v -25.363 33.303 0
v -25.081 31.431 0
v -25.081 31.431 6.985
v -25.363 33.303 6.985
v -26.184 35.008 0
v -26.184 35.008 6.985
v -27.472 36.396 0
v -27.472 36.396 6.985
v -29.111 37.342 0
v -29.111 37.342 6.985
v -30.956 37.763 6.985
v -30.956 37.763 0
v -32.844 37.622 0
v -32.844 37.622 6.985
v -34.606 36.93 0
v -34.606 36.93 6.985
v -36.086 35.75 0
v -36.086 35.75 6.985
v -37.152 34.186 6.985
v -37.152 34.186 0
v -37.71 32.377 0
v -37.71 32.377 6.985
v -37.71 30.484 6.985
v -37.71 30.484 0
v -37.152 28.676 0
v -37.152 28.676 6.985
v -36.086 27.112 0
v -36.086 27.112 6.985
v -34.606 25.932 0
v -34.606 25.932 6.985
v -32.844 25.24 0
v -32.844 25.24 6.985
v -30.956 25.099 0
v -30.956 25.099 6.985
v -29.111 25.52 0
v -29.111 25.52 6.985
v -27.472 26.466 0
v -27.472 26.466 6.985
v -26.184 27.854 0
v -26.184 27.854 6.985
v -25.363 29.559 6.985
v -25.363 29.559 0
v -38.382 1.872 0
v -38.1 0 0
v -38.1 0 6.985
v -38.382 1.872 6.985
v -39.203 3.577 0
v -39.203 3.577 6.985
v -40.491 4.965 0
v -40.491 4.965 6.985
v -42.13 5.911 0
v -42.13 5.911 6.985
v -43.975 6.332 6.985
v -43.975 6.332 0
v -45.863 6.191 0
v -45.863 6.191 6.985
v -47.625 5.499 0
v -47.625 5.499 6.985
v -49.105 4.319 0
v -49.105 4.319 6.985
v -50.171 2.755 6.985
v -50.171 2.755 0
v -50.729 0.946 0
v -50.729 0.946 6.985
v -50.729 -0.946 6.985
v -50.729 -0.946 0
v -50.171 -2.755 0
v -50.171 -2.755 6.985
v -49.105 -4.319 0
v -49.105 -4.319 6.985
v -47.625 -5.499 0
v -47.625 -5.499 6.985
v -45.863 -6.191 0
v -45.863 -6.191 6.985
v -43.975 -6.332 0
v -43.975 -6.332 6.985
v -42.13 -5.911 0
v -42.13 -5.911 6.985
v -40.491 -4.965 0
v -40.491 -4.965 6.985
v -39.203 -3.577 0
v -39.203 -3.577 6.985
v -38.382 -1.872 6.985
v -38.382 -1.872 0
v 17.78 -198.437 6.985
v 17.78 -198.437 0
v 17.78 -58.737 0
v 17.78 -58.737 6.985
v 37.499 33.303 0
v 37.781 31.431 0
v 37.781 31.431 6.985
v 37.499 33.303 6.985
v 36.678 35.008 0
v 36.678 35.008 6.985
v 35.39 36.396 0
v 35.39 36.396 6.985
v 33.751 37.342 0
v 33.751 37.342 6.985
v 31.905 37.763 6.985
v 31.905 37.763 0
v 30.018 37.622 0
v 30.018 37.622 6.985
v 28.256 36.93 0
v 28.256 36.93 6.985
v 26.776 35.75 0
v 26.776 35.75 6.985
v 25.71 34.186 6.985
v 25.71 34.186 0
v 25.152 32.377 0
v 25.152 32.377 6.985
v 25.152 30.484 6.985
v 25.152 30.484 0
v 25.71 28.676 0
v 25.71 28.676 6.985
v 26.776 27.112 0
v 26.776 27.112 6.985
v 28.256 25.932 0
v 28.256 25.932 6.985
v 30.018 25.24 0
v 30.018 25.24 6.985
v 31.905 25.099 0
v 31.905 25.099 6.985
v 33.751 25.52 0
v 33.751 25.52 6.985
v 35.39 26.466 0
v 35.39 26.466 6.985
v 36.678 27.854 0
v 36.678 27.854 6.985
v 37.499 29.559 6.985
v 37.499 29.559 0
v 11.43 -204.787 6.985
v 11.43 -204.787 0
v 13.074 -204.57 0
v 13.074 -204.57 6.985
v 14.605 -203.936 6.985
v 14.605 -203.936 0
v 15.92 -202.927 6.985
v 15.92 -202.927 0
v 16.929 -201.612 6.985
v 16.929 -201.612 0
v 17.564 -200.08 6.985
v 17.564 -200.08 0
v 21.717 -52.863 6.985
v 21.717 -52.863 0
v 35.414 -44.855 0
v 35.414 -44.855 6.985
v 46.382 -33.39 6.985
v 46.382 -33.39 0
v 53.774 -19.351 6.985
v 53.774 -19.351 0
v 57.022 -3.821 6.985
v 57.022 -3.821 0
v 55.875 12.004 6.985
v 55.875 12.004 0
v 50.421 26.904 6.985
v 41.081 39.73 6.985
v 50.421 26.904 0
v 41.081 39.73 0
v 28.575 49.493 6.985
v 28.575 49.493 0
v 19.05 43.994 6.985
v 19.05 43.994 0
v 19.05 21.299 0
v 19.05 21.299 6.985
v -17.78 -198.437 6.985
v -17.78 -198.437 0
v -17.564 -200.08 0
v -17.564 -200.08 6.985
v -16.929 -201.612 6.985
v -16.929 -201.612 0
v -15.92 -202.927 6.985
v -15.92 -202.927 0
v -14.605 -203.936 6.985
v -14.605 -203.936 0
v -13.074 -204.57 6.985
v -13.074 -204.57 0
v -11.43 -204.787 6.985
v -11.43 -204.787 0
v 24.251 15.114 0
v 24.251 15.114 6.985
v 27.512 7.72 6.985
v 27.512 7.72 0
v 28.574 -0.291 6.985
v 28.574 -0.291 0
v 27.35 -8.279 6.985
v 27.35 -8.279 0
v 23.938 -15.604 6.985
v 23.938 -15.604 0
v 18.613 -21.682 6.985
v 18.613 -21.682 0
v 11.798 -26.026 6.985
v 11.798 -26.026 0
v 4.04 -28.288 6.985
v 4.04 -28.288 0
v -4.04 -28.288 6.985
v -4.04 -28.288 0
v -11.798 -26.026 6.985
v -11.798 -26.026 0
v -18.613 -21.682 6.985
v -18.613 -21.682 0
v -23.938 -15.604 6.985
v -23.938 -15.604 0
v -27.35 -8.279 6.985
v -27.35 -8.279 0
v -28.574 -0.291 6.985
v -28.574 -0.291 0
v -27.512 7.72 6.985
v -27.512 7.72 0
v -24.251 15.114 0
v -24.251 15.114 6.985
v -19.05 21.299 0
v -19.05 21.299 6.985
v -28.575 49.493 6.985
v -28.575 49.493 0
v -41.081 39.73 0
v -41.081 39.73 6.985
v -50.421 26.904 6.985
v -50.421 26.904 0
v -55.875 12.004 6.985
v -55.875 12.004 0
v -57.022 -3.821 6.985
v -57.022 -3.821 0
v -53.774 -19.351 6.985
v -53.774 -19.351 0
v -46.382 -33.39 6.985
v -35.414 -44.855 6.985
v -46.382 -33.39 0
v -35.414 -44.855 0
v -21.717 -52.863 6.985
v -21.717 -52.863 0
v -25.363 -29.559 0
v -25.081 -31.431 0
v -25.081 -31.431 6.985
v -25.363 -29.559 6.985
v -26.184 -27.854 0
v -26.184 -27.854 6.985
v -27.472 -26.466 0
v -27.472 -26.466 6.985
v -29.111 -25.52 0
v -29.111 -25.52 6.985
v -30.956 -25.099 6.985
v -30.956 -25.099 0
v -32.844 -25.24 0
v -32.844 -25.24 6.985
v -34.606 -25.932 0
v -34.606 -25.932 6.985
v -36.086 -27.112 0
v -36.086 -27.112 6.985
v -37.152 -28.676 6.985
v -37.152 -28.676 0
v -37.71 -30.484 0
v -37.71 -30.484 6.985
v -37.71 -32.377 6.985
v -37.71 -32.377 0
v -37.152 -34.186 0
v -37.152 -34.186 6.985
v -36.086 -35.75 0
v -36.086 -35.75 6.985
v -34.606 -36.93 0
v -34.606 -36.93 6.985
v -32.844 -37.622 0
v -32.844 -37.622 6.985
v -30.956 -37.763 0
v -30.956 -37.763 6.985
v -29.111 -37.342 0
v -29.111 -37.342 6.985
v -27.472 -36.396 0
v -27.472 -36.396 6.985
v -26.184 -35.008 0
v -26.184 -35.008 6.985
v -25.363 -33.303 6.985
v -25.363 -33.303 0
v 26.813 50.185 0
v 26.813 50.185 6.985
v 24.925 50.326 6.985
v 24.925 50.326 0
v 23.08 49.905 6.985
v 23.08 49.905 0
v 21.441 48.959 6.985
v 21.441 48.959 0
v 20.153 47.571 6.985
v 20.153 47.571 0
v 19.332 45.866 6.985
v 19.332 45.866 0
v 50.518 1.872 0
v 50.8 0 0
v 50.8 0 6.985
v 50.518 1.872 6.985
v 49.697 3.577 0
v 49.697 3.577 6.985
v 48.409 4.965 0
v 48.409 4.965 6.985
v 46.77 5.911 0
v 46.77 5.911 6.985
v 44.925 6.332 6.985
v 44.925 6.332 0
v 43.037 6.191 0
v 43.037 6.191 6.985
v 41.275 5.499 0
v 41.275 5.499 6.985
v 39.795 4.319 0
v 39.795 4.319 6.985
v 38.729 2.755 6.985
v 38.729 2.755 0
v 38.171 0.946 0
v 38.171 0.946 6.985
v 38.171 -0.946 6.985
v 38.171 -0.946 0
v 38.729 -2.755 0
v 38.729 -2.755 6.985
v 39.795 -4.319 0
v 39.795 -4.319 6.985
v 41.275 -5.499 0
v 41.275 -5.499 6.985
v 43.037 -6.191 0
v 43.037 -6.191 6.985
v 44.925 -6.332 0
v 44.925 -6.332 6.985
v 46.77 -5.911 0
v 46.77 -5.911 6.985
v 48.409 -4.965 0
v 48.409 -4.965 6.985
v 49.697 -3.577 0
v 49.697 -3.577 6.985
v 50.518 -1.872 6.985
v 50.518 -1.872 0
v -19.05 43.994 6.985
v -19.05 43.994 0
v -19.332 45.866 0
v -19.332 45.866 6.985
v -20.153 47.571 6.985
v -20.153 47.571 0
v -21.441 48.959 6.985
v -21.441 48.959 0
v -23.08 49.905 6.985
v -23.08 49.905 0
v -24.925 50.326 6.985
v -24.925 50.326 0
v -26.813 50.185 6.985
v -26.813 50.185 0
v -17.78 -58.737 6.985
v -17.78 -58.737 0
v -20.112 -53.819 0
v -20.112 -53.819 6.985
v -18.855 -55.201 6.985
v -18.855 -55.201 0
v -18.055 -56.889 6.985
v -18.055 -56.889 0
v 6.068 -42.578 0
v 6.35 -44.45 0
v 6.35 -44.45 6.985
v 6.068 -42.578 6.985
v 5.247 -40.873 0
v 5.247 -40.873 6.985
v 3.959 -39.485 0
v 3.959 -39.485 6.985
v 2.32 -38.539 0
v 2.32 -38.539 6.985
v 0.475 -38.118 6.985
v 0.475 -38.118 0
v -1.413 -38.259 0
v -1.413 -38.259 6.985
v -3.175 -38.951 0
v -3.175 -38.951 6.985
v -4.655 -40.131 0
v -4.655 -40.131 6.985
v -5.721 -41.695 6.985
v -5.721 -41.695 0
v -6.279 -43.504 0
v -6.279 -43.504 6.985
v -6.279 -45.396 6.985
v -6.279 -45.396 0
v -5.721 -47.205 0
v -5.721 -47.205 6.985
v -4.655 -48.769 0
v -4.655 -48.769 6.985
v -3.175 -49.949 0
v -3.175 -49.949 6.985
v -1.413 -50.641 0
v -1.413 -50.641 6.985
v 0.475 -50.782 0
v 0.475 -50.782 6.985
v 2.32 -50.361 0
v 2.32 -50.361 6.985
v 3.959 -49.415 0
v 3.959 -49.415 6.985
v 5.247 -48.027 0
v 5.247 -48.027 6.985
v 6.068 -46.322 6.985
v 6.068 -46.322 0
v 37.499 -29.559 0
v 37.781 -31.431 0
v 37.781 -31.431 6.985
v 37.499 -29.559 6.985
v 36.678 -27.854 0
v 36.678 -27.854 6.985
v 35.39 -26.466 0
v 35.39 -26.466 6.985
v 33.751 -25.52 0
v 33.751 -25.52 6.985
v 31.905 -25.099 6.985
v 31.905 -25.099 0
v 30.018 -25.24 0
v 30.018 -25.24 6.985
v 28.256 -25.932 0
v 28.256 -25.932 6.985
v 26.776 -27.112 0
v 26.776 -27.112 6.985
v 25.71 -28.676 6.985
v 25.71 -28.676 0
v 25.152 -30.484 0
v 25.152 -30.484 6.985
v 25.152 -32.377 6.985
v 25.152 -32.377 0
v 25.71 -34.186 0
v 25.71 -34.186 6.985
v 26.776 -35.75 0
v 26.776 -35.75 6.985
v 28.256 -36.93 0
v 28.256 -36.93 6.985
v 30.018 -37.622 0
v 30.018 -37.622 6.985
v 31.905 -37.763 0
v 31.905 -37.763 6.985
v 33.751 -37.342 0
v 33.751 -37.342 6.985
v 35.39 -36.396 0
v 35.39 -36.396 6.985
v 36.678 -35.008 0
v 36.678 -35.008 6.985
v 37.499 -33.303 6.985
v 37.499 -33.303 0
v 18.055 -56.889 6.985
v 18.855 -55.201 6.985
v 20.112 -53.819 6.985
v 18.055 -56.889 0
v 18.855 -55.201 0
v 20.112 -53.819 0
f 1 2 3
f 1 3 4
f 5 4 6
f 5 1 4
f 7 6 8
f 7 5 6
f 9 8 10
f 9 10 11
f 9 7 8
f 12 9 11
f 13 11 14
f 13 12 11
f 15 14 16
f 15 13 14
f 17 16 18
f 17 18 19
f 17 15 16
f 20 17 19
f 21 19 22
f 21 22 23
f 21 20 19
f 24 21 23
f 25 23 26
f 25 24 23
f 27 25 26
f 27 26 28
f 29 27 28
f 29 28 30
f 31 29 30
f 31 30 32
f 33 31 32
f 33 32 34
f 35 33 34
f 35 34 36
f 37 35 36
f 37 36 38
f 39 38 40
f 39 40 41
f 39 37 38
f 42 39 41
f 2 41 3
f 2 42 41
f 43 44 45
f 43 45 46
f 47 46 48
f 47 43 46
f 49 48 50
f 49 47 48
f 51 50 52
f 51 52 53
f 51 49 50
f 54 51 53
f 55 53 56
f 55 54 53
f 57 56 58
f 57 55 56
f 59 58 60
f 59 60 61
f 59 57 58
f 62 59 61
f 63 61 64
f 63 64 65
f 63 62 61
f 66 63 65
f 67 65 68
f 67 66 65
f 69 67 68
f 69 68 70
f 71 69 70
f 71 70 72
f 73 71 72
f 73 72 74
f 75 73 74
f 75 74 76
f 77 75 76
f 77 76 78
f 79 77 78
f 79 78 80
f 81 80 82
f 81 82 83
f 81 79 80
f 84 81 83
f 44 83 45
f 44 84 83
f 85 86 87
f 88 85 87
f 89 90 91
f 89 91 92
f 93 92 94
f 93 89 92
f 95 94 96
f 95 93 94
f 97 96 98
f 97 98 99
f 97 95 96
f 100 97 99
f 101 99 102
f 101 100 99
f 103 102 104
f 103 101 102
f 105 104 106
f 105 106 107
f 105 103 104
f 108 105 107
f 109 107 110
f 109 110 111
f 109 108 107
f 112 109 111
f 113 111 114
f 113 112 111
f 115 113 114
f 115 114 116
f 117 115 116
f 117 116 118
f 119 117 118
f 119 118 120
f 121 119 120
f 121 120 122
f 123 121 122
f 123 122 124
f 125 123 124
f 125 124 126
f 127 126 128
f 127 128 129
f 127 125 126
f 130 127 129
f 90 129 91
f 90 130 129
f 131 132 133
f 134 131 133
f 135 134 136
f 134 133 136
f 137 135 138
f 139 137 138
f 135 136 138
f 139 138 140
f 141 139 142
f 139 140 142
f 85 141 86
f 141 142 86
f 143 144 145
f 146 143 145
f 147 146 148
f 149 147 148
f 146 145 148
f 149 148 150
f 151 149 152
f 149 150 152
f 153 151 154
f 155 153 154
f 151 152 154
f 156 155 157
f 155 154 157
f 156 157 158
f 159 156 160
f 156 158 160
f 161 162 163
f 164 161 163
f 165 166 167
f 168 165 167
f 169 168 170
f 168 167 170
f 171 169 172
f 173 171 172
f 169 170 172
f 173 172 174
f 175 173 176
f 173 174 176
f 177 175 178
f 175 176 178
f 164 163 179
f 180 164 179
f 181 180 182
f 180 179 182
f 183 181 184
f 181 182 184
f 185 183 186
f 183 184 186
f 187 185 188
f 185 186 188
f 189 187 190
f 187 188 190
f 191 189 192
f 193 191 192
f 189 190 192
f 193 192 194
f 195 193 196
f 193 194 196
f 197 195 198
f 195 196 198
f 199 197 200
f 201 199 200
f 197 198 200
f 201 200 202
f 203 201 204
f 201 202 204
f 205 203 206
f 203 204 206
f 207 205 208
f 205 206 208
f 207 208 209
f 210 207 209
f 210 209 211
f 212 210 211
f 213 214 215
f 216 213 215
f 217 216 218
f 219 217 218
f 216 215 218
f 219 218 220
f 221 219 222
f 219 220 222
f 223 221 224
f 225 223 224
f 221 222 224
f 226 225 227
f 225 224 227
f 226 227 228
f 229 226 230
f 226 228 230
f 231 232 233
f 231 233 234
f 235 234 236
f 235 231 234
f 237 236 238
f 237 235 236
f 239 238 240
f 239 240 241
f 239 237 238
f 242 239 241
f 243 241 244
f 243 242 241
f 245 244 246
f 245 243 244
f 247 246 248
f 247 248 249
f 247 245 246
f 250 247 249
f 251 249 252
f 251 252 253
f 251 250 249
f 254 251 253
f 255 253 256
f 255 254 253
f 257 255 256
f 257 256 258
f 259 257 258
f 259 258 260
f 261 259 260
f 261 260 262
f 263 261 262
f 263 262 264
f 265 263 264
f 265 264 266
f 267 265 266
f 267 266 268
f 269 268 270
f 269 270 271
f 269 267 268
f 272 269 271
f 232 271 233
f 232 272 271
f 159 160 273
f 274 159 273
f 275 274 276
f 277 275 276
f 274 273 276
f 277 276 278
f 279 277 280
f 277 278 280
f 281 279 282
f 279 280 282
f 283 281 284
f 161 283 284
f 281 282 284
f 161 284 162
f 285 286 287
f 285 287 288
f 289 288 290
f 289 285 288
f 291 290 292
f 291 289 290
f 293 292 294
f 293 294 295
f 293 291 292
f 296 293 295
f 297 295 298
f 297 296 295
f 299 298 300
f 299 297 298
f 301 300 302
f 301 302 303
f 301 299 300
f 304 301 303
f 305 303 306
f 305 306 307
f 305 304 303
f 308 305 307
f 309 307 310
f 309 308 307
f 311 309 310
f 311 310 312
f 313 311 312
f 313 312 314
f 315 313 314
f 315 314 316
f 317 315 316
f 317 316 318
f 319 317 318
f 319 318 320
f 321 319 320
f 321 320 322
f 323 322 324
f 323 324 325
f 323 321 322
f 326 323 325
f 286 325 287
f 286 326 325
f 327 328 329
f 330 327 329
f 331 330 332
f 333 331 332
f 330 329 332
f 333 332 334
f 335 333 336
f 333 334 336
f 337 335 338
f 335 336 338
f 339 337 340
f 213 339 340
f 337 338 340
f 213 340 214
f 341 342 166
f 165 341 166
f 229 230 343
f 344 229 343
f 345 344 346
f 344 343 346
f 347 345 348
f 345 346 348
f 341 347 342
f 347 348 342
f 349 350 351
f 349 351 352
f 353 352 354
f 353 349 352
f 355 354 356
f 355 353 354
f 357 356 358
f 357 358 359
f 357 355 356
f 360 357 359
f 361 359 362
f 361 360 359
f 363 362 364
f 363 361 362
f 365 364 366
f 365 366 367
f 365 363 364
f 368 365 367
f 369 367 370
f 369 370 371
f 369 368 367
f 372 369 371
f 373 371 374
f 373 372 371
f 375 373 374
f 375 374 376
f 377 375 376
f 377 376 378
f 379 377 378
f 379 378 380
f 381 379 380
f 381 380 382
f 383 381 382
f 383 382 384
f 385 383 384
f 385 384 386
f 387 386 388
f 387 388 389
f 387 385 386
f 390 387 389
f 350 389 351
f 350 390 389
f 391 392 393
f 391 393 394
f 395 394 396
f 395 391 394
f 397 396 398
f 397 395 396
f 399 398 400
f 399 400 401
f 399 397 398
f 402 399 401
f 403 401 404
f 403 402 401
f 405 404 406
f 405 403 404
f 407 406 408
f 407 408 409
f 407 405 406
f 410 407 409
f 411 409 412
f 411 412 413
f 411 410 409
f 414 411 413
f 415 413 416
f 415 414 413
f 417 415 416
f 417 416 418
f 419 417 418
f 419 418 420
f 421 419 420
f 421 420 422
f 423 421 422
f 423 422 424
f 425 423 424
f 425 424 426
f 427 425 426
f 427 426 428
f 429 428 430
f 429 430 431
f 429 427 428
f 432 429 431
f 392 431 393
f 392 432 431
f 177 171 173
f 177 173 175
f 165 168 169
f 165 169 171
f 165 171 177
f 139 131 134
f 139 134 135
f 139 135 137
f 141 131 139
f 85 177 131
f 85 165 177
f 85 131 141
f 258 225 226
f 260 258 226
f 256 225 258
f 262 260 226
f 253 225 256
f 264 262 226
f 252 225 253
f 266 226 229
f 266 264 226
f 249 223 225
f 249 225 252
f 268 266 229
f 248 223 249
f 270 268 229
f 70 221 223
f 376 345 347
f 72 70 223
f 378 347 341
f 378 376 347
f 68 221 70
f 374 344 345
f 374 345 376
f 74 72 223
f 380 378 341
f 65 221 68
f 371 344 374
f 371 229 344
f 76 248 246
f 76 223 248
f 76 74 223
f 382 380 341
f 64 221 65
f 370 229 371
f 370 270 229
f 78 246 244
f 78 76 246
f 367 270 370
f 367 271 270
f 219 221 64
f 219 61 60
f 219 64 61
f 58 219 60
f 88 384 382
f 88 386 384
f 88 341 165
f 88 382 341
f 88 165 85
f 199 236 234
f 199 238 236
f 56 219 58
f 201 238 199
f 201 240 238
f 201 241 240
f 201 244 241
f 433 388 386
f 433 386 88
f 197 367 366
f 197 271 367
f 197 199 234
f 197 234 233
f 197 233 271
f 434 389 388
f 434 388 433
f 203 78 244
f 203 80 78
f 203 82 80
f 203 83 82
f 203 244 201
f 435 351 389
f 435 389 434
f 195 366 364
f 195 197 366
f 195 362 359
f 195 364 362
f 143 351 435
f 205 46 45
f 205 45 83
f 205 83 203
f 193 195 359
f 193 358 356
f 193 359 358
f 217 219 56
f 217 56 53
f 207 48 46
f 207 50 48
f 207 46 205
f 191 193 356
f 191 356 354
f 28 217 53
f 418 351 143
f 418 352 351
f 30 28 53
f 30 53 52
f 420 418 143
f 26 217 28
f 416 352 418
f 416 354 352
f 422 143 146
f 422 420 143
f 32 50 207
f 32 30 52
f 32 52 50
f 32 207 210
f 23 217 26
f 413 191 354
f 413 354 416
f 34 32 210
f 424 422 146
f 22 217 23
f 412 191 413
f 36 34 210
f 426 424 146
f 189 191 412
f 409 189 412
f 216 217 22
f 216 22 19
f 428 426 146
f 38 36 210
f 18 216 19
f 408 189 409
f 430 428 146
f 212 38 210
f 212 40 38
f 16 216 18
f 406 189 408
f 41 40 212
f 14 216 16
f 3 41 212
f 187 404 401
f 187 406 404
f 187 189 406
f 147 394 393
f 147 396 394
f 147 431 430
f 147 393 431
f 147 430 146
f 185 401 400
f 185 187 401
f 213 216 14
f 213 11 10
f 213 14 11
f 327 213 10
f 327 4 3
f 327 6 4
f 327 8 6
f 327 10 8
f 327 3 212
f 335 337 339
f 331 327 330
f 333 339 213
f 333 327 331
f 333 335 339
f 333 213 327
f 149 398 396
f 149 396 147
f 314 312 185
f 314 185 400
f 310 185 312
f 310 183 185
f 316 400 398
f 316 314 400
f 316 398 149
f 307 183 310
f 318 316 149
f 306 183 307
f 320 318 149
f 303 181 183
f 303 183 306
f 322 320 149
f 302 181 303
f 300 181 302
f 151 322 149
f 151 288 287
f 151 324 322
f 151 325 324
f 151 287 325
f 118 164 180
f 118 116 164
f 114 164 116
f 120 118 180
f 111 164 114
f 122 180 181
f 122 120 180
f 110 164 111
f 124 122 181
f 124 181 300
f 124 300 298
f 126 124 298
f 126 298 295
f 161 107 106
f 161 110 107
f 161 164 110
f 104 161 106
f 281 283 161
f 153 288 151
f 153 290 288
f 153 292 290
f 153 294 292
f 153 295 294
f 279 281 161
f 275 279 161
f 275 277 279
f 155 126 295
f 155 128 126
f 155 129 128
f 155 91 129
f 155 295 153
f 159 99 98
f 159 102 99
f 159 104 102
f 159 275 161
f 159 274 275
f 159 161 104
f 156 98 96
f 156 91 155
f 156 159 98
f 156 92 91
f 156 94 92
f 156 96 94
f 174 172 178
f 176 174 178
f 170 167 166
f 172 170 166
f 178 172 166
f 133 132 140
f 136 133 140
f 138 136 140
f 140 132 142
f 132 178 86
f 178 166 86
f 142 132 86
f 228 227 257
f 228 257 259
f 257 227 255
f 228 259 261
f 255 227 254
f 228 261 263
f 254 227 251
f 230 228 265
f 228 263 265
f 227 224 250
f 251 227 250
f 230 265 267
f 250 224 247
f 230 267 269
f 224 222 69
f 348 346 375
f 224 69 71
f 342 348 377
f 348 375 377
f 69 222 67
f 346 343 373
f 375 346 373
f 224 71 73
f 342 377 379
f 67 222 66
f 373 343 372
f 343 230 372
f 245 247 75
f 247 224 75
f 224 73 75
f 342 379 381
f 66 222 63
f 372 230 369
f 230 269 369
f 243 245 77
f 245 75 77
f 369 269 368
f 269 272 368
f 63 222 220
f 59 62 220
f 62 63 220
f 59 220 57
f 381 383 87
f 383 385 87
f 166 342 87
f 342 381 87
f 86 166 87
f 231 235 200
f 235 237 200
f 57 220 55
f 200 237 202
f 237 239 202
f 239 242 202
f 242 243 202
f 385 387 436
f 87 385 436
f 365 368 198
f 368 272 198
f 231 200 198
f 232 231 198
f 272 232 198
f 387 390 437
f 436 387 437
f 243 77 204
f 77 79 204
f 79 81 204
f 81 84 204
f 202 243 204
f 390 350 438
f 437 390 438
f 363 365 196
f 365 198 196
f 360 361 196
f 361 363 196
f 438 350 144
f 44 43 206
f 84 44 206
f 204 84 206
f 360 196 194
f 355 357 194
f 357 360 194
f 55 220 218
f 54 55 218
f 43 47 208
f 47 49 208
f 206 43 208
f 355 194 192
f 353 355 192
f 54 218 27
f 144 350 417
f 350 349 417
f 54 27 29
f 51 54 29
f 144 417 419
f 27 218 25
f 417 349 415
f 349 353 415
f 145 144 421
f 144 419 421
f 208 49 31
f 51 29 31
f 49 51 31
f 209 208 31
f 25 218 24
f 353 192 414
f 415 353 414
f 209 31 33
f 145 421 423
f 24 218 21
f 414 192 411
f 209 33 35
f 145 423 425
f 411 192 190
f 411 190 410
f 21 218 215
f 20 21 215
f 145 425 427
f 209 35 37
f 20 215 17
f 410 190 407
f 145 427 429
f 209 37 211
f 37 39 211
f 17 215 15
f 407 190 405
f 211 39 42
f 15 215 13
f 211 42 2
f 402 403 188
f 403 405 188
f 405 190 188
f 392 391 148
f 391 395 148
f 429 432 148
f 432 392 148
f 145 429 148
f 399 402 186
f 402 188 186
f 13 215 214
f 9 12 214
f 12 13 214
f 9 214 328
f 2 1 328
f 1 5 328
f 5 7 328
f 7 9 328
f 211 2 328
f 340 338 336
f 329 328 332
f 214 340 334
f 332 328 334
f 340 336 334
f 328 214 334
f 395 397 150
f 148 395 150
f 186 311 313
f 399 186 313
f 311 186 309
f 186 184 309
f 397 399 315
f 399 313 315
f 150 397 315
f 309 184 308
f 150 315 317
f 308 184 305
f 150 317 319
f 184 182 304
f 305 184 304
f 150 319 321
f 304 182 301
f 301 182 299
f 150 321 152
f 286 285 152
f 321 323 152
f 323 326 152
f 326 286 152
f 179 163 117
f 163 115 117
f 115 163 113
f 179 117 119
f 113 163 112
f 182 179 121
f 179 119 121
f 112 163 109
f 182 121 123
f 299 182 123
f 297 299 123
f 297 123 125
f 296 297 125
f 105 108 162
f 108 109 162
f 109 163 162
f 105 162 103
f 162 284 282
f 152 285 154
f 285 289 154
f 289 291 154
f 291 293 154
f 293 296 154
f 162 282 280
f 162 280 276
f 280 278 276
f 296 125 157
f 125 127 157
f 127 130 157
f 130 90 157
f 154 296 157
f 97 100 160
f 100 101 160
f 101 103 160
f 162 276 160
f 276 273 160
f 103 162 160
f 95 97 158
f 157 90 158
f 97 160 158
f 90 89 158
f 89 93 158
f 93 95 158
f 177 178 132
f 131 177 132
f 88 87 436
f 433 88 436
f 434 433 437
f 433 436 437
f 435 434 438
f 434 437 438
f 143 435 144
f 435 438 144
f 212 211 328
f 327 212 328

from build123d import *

# Parameters (mm, degrees)
F0_R     = 6.35
F1_DEPTH = 6.985


with BuildPart() as f1:
    # F0 (on Top) → F1 (new body)
    with BuildSketch(Plane.XY):
        with BuildLine():
            ThreePointArc((-19.05, 43.994091), (-22.225, 49.493352), (-28.575, 49.493352))
            ThreePointArc((-28.575, 49.493352), (-57.022152, -3.820554), (-21.717, -52.862978))
            ThreePointArc((-21.717, -52.862978), (-18.855294, -55.201112), (-17.78, -58.736642))
            Line((-17.78, -58.736642), (-17.78, -198.436642))
            ThreePointArc((-17.78, -198.436642), (-15.920128, -202.92677), (-11.43, -204.786642))
            Line((-11.43, -204.786642), (11.43, -204.786642))
            ThreePointArc((11.43, -204.786642), (15.920128, -202.92677), (17.78, -198.436642))
            Line((17.78, -198.436642), (17.78, -58.736642))
            ThreePointArc((17.78, -58.736642), (18.855294, -55.201112), (21.717, -52.862978))
            ThreePointArc((21.717, -52.862978), (57.022152, -3.820554), (28.575, 49.493352))
            ThreePointArc((28.575, 49.493352), (22.225, 49.493352), (19.05, 43.994091))
            Line((19.05, 43.994091), (19.05, 21.298547))
            ThreePointArc((19.05, 21.298547), (0, -28.575), (-19.05, 21.298547))
            Line((-19.05, 21.298547), (-19.05, 43.994091))
        make_face()
        with Locations((-31.430896, -31.430896)):
            Circle(F0_R, mode=Mode.SUBTRACT)
        with Locations((0, -44.45)):
            Circle(F0_R, mode=Mode.SUBTRACT)
        with Locations((-44.45, 0)):
            Circle(F0_R, mode=Mode.SUBTRACT)
        with Locations((-31.430896, 31.430896)):
            Circle(F0_R, mode=Mode.SUBTRACT)
        with Locations((31.430896, -31.430896)):
            Circle(F0_R, mode=Mode.SUBTRACT)
        with Locations((44.45, 0)):
            Circle(F0_R, mode=Mode.SUBTRACT)
        with Locations((31.430896, 31.430896)):
            Circle(F0_R, mode=Mode.SUBTRACT)
    extrude(amount=F1_DEPTH)


solid = f1.part
